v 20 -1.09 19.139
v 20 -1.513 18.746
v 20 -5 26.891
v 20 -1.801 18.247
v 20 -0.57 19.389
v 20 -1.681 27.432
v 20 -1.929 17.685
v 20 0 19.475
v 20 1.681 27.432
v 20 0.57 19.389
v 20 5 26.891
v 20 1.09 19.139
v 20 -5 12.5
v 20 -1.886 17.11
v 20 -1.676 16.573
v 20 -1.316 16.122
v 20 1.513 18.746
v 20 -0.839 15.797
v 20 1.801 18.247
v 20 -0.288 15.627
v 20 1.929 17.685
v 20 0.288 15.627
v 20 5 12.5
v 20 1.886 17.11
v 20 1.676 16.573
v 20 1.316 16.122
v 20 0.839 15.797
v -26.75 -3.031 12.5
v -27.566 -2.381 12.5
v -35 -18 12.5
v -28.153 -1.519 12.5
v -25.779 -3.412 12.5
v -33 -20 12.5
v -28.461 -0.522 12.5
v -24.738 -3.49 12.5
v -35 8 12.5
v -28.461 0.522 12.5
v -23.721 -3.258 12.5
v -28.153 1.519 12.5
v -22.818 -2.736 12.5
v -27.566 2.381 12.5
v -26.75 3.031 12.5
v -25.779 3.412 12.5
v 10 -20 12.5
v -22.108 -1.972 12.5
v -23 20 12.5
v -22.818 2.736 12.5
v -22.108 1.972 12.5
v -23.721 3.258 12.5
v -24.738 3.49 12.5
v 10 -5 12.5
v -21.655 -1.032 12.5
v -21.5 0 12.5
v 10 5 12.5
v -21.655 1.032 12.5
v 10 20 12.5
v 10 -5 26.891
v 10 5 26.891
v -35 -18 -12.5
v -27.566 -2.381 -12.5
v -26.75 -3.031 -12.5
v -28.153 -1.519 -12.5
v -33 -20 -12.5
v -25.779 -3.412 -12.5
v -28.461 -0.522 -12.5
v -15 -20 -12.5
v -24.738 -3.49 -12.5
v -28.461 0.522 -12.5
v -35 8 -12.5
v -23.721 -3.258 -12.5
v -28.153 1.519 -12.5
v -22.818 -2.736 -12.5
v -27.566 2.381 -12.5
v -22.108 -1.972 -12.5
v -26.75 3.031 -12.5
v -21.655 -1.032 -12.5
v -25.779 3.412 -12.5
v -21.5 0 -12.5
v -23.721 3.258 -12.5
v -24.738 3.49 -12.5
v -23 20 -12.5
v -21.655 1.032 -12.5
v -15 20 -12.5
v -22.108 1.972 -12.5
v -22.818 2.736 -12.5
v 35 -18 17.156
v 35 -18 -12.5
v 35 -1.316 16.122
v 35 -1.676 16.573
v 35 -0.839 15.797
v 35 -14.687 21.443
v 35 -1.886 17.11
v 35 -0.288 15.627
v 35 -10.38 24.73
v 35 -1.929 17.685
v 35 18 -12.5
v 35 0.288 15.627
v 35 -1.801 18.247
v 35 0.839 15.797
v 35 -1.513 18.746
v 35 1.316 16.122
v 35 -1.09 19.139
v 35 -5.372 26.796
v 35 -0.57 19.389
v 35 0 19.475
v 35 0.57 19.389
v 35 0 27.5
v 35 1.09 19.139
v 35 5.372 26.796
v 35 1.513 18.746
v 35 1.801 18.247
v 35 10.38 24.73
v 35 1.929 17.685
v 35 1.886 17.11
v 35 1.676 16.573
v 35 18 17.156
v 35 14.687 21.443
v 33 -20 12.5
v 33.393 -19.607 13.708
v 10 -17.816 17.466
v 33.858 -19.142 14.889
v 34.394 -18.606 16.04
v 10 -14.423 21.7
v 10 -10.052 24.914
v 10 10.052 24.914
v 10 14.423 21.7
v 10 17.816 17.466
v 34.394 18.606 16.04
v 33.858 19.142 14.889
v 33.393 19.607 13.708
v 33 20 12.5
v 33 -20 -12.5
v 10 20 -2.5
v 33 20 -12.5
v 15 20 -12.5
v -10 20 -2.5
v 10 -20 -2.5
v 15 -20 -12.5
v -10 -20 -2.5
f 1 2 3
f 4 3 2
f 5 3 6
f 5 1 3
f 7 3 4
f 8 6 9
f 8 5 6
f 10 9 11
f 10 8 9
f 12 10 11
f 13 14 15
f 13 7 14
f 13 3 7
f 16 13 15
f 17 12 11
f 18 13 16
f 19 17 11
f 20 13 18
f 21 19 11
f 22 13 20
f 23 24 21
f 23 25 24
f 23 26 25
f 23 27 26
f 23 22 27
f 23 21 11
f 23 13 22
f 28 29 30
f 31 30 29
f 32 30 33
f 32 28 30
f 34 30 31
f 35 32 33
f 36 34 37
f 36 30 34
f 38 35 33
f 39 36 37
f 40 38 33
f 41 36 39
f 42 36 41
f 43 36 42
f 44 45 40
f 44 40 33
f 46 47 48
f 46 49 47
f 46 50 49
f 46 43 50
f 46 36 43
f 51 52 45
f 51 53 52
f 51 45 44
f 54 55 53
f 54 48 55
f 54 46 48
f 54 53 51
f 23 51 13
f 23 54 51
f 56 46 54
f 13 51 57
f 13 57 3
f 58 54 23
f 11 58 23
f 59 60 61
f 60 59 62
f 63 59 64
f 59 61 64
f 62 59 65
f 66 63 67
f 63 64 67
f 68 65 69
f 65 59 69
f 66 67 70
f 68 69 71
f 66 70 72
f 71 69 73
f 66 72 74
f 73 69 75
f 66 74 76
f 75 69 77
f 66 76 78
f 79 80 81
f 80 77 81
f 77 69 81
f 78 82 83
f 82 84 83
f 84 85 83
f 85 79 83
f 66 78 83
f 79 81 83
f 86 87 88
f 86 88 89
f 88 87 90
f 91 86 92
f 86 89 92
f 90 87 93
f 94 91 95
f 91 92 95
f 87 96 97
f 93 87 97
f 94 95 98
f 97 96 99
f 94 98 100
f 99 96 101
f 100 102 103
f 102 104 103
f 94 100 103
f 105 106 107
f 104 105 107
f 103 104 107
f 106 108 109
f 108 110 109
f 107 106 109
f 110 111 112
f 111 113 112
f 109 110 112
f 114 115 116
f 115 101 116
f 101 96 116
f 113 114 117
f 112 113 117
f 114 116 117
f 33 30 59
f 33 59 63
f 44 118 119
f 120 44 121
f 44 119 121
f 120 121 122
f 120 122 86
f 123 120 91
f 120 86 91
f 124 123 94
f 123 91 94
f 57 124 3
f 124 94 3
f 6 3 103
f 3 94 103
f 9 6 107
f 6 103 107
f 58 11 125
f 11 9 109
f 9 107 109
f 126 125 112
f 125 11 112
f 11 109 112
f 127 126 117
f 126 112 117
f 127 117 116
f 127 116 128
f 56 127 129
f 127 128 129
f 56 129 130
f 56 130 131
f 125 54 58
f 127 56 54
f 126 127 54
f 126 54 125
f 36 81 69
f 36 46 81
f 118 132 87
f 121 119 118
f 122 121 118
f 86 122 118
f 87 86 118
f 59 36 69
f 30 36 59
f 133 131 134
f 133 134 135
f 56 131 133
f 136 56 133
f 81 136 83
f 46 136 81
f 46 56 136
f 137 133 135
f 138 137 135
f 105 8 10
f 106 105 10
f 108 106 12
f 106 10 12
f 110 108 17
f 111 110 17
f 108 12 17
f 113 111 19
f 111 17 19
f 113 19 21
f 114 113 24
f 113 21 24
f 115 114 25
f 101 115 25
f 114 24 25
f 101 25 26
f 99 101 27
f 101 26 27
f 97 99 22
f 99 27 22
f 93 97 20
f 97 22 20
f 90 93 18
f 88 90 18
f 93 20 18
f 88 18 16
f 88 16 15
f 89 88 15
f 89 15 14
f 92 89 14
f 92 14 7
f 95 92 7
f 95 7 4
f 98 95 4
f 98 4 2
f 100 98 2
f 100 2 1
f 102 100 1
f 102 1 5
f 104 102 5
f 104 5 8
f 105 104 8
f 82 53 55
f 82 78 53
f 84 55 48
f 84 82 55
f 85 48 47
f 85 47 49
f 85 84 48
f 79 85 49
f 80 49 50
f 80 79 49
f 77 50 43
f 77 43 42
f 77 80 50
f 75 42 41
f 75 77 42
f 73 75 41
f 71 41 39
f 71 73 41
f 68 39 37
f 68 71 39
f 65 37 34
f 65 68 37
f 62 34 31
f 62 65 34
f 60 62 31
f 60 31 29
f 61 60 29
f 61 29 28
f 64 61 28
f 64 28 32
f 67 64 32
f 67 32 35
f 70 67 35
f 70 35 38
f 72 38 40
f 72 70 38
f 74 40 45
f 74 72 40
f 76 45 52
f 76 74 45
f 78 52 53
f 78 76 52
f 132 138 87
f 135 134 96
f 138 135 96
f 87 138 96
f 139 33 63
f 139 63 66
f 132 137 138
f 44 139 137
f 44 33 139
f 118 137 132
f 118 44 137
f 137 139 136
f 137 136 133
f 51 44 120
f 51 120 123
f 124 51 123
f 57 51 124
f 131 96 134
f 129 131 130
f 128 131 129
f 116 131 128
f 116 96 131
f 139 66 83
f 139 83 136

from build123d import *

# Parameters (mm, degrees)
SKETCH1_R           = 3.5
BOSS_EXTRUDE1_DEPTH = 12.5
CUT_EXTRUDE1_DEPTH  = 55.60082417
BOSS_EXTRUDE3_DEPTH = 25
CUT_EXTRUDE2_DEPTH  = 57.789083458
SKETCH8_W           = 10
SKETCH8_H           = 10
CUT_EXTRUDE3_DEPTH  = 48.434164903
SKETCH9_R           = 1.934793031
CUT_EXTRUDE4_DEPTH  = 65.662585782


with BuildPart() as part:
    # Sketch1 → Boss-Extrude1 (new, symmetric)
    with BuildSketch(Plane.XY):
        Polygon((-23, 20), (-35, 8), (-35, -18), (-33, -20), (33, -20), (35, -18), (35, 18), (33, 20), align=None)
        with Locations((-25, 0)):
            Circle(SKETCH1_R, mode=Mode.SUBTRACT)
    extrude(amount=BOSS_EXTRUDE1_DEPTH, both=True)

    # Sketch2 → Cut-Extrude1 (cut, through all)
    with BuildSketch(Plane.XZ.offset(20)):
        Polygon((-10, -2.5), (10, -2.5), (15, -12.5), (-15, -12.5), align=None)
    extrude(amount=-CUT_EXTRUDE1_DEPTH, mode=Mode.SUBTRACT)

    # Sketch5 → Boss-Extrude3 (add)
    with BuildSketch(Plane(origin=(35, 0, 0), x_dir=(0, 0, -1), z_dir=(1, 0, 0))):
        with BuildLine():
            Line((-12.5, 20), (-12.5, -20))
            ThreePointArc((-12.5, -20), (-27.5, 0), (-12.5, 20))
        make_face()
    extrude(amount=-BOSS_EXTRUDE3_DEPTH)

    # Sketch6 → Cut-Extrude2 (cut, through all)
    with BuildSketch(Plane(origin=(0, 0, -12.5), x_dir=(-1, 0, 0), z_dir=(0, 0, -1))):
        Polygon((-35, 20), (-35, 18), (-33, 20), align=None)
        Polygon((-35, -20), (-33, -20), (-35, -18), align=None)
    extrude(amount=-CUT_EXTRUDE2_DEPTH, mode=Mode.SUBTRACT)

    # Sketch8 → Cut-Extrude3 (cut, through all)
    with BuildSketch(Plane.XY.offset(12.5)):
        with Locations((15, 0)):
            Rectangle(SKETCH8_W, SKETCH8_H)
    extrude(amount=CUT_EXTRUDE3_DEPTH, mode=Mode.SUBTRACT)

    # Sketch9 → Cut-Extrude4 (cut, through all)
    with BuildSketch(Plane.ZY.offset(-20)):
        with Locations((17.540032759, 0)):
            Circle(SKETCH9_R)
    extrude(amount=-CUT_EXTRUDE4_DEPTH, mode=Mode.SUBTRACT)


solid = part.part
